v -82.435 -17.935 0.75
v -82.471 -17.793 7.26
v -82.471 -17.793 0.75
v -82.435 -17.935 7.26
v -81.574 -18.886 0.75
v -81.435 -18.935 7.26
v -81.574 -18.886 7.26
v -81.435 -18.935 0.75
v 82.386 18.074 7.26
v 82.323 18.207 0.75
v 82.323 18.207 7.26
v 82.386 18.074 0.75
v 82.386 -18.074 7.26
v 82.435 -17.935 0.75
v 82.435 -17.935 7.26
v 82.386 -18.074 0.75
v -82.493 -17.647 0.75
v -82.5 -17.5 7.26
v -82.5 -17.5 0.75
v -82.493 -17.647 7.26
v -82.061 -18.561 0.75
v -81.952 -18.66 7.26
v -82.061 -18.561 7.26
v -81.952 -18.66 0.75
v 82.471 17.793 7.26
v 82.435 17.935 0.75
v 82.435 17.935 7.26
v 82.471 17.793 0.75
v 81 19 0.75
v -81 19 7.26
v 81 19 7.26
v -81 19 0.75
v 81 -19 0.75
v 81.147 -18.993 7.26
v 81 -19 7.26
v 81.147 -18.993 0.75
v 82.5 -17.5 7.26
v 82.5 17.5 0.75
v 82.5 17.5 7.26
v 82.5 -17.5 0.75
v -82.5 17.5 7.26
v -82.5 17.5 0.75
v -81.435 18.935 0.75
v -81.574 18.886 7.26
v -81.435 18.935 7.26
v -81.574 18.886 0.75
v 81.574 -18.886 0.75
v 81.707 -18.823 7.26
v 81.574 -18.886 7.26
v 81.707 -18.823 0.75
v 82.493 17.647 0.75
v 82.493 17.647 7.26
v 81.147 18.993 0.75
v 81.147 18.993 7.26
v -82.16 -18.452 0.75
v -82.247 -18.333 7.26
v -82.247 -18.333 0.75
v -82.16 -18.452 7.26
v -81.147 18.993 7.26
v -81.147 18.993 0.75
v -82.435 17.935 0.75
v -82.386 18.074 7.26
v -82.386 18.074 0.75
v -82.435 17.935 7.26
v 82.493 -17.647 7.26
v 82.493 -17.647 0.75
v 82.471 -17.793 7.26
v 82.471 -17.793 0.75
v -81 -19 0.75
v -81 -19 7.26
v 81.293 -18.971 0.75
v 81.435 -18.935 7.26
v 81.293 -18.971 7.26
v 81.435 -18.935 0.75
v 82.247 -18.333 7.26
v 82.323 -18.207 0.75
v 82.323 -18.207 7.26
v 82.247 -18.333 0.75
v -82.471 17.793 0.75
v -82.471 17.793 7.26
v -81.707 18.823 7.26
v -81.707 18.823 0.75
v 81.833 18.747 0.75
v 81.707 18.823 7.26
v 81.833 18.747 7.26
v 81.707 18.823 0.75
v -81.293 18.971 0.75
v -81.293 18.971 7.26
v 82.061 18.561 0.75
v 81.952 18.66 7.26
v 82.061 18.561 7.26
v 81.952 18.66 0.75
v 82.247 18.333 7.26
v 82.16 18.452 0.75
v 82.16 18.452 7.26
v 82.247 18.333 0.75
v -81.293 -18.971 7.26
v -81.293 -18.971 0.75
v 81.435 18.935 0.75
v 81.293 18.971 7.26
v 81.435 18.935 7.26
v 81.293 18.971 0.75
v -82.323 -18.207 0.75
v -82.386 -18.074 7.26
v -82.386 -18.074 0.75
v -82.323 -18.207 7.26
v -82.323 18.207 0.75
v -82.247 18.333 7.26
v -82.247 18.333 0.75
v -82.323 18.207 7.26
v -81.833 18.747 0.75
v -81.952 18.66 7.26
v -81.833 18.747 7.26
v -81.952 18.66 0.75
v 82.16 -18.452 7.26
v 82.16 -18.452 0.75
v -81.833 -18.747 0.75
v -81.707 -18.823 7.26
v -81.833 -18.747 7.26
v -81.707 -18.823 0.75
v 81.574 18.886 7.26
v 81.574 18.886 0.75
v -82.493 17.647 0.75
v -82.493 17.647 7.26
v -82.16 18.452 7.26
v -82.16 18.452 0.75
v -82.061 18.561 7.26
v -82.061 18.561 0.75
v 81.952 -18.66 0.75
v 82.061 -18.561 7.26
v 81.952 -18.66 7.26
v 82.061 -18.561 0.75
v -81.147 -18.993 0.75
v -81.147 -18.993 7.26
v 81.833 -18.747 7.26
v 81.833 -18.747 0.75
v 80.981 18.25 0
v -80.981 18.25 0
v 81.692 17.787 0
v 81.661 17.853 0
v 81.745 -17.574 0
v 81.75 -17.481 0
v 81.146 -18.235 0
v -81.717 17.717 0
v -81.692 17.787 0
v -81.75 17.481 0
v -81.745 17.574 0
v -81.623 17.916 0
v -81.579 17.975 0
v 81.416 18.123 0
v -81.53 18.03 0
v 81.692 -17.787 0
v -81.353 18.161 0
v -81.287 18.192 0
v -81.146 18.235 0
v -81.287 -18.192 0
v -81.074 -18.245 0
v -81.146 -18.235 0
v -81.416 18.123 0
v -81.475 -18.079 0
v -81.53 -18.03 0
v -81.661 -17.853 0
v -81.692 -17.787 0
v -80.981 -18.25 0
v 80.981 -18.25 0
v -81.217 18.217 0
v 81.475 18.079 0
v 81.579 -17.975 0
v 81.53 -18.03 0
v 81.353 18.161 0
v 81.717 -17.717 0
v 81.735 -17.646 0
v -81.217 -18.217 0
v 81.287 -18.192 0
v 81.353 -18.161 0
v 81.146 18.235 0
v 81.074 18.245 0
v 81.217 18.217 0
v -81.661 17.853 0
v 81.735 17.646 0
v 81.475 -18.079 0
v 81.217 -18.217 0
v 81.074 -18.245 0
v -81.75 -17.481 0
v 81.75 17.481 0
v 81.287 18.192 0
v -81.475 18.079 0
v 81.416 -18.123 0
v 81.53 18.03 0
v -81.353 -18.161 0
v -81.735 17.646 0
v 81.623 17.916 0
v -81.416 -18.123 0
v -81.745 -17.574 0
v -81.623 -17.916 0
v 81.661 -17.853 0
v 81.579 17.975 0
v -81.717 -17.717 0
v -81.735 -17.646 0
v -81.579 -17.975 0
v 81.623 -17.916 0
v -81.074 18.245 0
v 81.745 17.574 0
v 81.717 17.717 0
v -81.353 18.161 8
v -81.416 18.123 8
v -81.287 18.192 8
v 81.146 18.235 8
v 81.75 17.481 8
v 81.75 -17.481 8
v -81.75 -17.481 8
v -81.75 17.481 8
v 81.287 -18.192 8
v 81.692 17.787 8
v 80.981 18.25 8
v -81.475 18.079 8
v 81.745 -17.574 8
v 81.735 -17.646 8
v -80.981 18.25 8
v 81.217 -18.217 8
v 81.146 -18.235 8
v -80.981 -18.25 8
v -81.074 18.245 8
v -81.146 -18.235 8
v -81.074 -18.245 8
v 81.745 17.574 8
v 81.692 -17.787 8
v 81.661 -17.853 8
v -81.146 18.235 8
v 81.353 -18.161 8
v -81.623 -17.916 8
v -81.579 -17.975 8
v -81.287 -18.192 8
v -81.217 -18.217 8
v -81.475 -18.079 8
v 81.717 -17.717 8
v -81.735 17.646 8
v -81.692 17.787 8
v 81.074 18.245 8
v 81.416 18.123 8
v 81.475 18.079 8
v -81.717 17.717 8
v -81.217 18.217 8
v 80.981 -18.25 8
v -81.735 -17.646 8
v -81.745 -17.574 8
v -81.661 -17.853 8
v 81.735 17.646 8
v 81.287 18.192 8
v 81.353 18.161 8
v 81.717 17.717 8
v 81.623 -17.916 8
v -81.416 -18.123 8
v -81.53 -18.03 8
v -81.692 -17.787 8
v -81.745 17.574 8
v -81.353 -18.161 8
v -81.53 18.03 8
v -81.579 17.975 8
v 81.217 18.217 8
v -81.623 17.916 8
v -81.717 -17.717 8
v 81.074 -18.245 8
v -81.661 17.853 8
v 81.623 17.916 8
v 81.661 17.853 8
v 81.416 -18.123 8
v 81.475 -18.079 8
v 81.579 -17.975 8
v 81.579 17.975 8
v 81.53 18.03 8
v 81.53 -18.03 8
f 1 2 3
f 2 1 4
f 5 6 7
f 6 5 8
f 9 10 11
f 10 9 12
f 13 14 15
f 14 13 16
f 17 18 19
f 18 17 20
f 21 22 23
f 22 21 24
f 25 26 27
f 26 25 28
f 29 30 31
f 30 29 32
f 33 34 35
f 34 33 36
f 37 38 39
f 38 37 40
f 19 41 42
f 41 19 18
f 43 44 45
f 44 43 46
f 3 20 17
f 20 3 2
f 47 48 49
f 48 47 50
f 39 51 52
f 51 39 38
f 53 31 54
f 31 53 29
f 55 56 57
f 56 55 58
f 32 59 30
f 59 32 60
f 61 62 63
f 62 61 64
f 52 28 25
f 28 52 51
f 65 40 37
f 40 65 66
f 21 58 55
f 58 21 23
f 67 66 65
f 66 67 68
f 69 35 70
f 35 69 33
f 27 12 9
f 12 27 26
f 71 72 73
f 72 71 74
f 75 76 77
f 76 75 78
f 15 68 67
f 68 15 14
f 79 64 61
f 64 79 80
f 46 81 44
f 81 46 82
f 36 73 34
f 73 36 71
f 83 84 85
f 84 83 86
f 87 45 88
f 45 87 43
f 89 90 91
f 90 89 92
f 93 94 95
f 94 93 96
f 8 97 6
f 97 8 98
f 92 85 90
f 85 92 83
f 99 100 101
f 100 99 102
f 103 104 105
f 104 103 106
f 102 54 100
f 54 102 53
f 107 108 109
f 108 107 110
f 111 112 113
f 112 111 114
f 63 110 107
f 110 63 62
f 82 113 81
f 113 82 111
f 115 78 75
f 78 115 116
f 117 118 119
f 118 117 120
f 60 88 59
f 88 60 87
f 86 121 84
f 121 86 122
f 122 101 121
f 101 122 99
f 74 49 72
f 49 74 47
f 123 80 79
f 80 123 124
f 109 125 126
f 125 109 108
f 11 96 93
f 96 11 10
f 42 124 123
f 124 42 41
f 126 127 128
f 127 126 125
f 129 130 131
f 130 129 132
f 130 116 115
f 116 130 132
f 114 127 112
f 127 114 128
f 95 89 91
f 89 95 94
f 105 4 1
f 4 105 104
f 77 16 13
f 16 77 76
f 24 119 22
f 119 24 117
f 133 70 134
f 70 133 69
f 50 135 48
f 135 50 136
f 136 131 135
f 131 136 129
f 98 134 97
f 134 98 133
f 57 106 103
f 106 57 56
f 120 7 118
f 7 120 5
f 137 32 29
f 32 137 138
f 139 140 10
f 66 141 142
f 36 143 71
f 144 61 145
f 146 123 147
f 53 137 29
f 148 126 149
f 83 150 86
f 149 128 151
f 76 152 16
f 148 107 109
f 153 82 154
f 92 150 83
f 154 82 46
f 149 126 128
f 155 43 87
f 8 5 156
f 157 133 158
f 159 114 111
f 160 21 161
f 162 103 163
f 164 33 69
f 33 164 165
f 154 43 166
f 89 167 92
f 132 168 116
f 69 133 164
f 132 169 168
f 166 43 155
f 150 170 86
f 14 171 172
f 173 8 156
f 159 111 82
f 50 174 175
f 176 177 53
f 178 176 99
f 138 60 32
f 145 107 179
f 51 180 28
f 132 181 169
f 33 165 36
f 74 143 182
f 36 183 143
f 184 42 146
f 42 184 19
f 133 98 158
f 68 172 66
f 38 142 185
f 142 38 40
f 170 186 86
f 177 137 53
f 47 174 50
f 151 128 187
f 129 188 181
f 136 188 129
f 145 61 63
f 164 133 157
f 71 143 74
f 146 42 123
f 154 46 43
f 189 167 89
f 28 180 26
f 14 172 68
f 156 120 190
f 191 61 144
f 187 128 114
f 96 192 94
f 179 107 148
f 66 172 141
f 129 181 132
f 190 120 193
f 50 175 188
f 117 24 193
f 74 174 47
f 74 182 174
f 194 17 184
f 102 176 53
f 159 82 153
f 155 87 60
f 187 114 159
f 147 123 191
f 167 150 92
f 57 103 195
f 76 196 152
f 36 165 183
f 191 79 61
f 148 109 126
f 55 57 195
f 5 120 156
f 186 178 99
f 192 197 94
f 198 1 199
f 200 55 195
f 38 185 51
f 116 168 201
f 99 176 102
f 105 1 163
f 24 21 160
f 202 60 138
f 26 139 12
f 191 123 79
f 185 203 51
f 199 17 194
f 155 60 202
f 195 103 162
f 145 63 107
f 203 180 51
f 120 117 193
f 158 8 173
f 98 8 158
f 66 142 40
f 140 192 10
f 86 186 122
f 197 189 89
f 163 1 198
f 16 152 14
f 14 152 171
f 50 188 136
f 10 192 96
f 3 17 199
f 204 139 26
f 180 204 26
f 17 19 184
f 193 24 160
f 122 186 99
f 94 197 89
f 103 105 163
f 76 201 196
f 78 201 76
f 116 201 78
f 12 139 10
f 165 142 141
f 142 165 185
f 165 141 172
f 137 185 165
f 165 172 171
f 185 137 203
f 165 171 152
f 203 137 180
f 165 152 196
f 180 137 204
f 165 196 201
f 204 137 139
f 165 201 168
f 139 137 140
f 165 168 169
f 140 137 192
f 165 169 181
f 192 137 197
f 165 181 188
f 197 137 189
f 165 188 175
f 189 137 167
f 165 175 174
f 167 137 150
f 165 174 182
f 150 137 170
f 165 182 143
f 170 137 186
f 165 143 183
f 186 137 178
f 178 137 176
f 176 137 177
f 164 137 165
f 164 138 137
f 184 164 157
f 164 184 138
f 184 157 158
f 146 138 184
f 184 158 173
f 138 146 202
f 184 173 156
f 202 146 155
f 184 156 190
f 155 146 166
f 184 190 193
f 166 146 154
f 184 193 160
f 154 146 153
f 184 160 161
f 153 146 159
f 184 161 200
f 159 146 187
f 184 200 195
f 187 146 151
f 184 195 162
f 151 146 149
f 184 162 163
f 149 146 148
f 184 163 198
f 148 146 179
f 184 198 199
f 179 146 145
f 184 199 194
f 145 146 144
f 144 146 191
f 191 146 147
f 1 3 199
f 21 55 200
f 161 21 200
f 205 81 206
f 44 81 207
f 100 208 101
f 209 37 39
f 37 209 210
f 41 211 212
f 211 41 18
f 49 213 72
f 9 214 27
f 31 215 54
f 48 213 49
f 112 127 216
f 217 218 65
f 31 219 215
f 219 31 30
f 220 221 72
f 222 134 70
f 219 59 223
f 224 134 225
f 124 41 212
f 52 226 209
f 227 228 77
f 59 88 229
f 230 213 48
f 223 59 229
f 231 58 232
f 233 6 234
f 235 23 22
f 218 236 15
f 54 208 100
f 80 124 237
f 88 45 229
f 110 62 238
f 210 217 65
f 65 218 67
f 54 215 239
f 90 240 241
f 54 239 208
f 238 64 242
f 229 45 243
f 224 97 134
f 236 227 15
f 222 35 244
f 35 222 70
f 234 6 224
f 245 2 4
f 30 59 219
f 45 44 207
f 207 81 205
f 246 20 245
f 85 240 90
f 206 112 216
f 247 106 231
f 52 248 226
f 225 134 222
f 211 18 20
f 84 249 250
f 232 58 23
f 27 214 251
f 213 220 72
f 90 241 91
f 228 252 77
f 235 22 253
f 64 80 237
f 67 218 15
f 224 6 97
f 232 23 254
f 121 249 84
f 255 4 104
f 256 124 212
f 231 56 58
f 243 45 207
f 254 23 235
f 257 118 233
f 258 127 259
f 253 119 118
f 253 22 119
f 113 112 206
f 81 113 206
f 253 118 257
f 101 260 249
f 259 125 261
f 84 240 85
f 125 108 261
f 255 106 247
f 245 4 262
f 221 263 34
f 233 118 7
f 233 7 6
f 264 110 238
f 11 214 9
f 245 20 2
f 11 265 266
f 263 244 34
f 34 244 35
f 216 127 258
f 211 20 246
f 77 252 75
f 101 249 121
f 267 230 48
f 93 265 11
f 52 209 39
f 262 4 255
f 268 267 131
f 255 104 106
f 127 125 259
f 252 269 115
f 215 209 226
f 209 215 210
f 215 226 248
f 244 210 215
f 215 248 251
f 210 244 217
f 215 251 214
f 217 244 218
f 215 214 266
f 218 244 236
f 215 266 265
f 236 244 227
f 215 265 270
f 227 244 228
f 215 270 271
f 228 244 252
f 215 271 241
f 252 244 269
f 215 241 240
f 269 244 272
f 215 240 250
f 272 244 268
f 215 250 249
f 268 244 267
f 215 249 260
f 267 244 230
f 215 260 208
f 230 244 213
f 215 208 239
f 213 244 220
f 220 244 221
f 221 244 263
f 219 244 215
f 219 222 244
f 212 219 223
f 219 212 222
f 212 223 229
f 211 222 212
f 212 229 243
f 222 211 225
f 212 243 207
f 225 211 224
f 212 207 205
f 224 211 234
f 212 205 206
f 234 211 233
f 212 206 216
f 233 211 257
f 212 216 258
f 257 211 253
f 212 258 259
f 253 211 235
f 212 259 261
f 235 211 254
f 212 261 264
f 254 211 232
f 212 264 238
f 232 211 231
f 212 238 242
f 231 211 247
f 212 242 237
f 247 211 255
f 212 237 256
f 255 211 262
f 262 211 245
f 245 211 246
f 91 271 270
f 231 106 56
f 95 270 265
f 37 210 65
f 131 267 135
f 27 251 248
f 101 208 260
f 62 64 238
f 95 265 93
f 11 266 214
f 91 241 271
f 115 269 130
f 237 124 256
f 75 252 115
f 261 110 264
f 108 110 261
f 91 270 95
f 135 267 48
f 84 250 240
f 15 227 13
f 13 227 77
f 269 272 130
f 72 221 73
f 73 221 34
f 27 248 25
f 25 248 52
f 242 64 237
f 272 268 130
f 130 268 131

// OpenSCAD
// FS-STRIP-L underfloor body-support strip liner
// J40 rubber recreation 3D model, units: millimetres.
// Generated by tools/generate_rubber_recreation_3d_models.py.
// OpenSCAD is the source model; export STL only after release parameters are set.

$fn = 64;

module rounded_rect_2d(size, r) {
  hull() {
    translate([-(size[0] / 2 - r), -(size[1] / 2 - r)]) circle(r = r);
    translate([ (size[0] / 2 - r), -(size[1] / 2 - r)]) circle(r = r);
    translate([ (size[0] / 2 - r),  (size[1] / 2 - r)]) circle(r = r);
    translate([-(size[0] / 2 - r),  (size[1] / 2 - r)]) circle(r = r);
  }
}

module capsule_2d(length, width) {
  hull() {
    translate([-(length - width) / 2, 0]) circle(d = width);
    translate([ (length - width) / 2, 0]) circle(d = width);
  }
}

module chamfered_extrude(height, edge_chamfer = 0) {
  eps = 0.01;
  if (edge_chamfer <= 0) {
    linear_extrude(height = height, center = false)
      children();
  } else {
    union() {
      translate([0, 0, edge_chamfer])
        linear_extrude(height = height - (2 * edge_chamfer), center = false)
          children();

      hull() {
        translate([0, 0, 0])
          linear_extrude(height = eps, center = false)
            offset(delta = -edge_chamfer)
              children();
        translate([0, 0, edge_chamfer])
          linear_extrude(height = eps, center = false)
            children();
      }

      hull() {
        translate([0, 0, height - edge_chamfer])
          linear_extrude(height = eps, center = false)
            children();
        translate([0, 0, height - eps])
          linear_extrude(height = eps, center = false)
            offset(delta = -edge_chamfer)
              children();
      }
    }
  }
}

// Current order basis:
// - Plain rubber strip 165 x 38 x 8.
// - 3D envelope is length x width x thickness; plan corner radius is 1.5 mm.
// - Top and bottom perimeter edge break/chamfer is modelled at 0.75 mm by default.
// - No holes by default; steel retainer slots belong to the separate retainer
//   unless the actual old rubber proves the rubber itself was pierced.

module fs_strip_l_plain_strip(
  strip_length = 165,
  strip_width = 38,
  strip_thickness = 8,
  corner_r = 1.5,
  edge_chamfer = 0.75,
  hole_d = 0,
  hole_centres = [-62.5, 62.5]
) {
  difference() {
    chamfered_extrude(height = strip_thickness, edge_chamfer = edge_chamfer)
      rounded_rect_2d([strip_length, strip_width], corner_r);

    if (hole_d > 0)
      for (x = hole_centres)
        translate([x, 0, -1])
          cylinder(h = strip_thickness + 2, d = hole_d);
  }
}

fs_strip_l_plain_strip();
